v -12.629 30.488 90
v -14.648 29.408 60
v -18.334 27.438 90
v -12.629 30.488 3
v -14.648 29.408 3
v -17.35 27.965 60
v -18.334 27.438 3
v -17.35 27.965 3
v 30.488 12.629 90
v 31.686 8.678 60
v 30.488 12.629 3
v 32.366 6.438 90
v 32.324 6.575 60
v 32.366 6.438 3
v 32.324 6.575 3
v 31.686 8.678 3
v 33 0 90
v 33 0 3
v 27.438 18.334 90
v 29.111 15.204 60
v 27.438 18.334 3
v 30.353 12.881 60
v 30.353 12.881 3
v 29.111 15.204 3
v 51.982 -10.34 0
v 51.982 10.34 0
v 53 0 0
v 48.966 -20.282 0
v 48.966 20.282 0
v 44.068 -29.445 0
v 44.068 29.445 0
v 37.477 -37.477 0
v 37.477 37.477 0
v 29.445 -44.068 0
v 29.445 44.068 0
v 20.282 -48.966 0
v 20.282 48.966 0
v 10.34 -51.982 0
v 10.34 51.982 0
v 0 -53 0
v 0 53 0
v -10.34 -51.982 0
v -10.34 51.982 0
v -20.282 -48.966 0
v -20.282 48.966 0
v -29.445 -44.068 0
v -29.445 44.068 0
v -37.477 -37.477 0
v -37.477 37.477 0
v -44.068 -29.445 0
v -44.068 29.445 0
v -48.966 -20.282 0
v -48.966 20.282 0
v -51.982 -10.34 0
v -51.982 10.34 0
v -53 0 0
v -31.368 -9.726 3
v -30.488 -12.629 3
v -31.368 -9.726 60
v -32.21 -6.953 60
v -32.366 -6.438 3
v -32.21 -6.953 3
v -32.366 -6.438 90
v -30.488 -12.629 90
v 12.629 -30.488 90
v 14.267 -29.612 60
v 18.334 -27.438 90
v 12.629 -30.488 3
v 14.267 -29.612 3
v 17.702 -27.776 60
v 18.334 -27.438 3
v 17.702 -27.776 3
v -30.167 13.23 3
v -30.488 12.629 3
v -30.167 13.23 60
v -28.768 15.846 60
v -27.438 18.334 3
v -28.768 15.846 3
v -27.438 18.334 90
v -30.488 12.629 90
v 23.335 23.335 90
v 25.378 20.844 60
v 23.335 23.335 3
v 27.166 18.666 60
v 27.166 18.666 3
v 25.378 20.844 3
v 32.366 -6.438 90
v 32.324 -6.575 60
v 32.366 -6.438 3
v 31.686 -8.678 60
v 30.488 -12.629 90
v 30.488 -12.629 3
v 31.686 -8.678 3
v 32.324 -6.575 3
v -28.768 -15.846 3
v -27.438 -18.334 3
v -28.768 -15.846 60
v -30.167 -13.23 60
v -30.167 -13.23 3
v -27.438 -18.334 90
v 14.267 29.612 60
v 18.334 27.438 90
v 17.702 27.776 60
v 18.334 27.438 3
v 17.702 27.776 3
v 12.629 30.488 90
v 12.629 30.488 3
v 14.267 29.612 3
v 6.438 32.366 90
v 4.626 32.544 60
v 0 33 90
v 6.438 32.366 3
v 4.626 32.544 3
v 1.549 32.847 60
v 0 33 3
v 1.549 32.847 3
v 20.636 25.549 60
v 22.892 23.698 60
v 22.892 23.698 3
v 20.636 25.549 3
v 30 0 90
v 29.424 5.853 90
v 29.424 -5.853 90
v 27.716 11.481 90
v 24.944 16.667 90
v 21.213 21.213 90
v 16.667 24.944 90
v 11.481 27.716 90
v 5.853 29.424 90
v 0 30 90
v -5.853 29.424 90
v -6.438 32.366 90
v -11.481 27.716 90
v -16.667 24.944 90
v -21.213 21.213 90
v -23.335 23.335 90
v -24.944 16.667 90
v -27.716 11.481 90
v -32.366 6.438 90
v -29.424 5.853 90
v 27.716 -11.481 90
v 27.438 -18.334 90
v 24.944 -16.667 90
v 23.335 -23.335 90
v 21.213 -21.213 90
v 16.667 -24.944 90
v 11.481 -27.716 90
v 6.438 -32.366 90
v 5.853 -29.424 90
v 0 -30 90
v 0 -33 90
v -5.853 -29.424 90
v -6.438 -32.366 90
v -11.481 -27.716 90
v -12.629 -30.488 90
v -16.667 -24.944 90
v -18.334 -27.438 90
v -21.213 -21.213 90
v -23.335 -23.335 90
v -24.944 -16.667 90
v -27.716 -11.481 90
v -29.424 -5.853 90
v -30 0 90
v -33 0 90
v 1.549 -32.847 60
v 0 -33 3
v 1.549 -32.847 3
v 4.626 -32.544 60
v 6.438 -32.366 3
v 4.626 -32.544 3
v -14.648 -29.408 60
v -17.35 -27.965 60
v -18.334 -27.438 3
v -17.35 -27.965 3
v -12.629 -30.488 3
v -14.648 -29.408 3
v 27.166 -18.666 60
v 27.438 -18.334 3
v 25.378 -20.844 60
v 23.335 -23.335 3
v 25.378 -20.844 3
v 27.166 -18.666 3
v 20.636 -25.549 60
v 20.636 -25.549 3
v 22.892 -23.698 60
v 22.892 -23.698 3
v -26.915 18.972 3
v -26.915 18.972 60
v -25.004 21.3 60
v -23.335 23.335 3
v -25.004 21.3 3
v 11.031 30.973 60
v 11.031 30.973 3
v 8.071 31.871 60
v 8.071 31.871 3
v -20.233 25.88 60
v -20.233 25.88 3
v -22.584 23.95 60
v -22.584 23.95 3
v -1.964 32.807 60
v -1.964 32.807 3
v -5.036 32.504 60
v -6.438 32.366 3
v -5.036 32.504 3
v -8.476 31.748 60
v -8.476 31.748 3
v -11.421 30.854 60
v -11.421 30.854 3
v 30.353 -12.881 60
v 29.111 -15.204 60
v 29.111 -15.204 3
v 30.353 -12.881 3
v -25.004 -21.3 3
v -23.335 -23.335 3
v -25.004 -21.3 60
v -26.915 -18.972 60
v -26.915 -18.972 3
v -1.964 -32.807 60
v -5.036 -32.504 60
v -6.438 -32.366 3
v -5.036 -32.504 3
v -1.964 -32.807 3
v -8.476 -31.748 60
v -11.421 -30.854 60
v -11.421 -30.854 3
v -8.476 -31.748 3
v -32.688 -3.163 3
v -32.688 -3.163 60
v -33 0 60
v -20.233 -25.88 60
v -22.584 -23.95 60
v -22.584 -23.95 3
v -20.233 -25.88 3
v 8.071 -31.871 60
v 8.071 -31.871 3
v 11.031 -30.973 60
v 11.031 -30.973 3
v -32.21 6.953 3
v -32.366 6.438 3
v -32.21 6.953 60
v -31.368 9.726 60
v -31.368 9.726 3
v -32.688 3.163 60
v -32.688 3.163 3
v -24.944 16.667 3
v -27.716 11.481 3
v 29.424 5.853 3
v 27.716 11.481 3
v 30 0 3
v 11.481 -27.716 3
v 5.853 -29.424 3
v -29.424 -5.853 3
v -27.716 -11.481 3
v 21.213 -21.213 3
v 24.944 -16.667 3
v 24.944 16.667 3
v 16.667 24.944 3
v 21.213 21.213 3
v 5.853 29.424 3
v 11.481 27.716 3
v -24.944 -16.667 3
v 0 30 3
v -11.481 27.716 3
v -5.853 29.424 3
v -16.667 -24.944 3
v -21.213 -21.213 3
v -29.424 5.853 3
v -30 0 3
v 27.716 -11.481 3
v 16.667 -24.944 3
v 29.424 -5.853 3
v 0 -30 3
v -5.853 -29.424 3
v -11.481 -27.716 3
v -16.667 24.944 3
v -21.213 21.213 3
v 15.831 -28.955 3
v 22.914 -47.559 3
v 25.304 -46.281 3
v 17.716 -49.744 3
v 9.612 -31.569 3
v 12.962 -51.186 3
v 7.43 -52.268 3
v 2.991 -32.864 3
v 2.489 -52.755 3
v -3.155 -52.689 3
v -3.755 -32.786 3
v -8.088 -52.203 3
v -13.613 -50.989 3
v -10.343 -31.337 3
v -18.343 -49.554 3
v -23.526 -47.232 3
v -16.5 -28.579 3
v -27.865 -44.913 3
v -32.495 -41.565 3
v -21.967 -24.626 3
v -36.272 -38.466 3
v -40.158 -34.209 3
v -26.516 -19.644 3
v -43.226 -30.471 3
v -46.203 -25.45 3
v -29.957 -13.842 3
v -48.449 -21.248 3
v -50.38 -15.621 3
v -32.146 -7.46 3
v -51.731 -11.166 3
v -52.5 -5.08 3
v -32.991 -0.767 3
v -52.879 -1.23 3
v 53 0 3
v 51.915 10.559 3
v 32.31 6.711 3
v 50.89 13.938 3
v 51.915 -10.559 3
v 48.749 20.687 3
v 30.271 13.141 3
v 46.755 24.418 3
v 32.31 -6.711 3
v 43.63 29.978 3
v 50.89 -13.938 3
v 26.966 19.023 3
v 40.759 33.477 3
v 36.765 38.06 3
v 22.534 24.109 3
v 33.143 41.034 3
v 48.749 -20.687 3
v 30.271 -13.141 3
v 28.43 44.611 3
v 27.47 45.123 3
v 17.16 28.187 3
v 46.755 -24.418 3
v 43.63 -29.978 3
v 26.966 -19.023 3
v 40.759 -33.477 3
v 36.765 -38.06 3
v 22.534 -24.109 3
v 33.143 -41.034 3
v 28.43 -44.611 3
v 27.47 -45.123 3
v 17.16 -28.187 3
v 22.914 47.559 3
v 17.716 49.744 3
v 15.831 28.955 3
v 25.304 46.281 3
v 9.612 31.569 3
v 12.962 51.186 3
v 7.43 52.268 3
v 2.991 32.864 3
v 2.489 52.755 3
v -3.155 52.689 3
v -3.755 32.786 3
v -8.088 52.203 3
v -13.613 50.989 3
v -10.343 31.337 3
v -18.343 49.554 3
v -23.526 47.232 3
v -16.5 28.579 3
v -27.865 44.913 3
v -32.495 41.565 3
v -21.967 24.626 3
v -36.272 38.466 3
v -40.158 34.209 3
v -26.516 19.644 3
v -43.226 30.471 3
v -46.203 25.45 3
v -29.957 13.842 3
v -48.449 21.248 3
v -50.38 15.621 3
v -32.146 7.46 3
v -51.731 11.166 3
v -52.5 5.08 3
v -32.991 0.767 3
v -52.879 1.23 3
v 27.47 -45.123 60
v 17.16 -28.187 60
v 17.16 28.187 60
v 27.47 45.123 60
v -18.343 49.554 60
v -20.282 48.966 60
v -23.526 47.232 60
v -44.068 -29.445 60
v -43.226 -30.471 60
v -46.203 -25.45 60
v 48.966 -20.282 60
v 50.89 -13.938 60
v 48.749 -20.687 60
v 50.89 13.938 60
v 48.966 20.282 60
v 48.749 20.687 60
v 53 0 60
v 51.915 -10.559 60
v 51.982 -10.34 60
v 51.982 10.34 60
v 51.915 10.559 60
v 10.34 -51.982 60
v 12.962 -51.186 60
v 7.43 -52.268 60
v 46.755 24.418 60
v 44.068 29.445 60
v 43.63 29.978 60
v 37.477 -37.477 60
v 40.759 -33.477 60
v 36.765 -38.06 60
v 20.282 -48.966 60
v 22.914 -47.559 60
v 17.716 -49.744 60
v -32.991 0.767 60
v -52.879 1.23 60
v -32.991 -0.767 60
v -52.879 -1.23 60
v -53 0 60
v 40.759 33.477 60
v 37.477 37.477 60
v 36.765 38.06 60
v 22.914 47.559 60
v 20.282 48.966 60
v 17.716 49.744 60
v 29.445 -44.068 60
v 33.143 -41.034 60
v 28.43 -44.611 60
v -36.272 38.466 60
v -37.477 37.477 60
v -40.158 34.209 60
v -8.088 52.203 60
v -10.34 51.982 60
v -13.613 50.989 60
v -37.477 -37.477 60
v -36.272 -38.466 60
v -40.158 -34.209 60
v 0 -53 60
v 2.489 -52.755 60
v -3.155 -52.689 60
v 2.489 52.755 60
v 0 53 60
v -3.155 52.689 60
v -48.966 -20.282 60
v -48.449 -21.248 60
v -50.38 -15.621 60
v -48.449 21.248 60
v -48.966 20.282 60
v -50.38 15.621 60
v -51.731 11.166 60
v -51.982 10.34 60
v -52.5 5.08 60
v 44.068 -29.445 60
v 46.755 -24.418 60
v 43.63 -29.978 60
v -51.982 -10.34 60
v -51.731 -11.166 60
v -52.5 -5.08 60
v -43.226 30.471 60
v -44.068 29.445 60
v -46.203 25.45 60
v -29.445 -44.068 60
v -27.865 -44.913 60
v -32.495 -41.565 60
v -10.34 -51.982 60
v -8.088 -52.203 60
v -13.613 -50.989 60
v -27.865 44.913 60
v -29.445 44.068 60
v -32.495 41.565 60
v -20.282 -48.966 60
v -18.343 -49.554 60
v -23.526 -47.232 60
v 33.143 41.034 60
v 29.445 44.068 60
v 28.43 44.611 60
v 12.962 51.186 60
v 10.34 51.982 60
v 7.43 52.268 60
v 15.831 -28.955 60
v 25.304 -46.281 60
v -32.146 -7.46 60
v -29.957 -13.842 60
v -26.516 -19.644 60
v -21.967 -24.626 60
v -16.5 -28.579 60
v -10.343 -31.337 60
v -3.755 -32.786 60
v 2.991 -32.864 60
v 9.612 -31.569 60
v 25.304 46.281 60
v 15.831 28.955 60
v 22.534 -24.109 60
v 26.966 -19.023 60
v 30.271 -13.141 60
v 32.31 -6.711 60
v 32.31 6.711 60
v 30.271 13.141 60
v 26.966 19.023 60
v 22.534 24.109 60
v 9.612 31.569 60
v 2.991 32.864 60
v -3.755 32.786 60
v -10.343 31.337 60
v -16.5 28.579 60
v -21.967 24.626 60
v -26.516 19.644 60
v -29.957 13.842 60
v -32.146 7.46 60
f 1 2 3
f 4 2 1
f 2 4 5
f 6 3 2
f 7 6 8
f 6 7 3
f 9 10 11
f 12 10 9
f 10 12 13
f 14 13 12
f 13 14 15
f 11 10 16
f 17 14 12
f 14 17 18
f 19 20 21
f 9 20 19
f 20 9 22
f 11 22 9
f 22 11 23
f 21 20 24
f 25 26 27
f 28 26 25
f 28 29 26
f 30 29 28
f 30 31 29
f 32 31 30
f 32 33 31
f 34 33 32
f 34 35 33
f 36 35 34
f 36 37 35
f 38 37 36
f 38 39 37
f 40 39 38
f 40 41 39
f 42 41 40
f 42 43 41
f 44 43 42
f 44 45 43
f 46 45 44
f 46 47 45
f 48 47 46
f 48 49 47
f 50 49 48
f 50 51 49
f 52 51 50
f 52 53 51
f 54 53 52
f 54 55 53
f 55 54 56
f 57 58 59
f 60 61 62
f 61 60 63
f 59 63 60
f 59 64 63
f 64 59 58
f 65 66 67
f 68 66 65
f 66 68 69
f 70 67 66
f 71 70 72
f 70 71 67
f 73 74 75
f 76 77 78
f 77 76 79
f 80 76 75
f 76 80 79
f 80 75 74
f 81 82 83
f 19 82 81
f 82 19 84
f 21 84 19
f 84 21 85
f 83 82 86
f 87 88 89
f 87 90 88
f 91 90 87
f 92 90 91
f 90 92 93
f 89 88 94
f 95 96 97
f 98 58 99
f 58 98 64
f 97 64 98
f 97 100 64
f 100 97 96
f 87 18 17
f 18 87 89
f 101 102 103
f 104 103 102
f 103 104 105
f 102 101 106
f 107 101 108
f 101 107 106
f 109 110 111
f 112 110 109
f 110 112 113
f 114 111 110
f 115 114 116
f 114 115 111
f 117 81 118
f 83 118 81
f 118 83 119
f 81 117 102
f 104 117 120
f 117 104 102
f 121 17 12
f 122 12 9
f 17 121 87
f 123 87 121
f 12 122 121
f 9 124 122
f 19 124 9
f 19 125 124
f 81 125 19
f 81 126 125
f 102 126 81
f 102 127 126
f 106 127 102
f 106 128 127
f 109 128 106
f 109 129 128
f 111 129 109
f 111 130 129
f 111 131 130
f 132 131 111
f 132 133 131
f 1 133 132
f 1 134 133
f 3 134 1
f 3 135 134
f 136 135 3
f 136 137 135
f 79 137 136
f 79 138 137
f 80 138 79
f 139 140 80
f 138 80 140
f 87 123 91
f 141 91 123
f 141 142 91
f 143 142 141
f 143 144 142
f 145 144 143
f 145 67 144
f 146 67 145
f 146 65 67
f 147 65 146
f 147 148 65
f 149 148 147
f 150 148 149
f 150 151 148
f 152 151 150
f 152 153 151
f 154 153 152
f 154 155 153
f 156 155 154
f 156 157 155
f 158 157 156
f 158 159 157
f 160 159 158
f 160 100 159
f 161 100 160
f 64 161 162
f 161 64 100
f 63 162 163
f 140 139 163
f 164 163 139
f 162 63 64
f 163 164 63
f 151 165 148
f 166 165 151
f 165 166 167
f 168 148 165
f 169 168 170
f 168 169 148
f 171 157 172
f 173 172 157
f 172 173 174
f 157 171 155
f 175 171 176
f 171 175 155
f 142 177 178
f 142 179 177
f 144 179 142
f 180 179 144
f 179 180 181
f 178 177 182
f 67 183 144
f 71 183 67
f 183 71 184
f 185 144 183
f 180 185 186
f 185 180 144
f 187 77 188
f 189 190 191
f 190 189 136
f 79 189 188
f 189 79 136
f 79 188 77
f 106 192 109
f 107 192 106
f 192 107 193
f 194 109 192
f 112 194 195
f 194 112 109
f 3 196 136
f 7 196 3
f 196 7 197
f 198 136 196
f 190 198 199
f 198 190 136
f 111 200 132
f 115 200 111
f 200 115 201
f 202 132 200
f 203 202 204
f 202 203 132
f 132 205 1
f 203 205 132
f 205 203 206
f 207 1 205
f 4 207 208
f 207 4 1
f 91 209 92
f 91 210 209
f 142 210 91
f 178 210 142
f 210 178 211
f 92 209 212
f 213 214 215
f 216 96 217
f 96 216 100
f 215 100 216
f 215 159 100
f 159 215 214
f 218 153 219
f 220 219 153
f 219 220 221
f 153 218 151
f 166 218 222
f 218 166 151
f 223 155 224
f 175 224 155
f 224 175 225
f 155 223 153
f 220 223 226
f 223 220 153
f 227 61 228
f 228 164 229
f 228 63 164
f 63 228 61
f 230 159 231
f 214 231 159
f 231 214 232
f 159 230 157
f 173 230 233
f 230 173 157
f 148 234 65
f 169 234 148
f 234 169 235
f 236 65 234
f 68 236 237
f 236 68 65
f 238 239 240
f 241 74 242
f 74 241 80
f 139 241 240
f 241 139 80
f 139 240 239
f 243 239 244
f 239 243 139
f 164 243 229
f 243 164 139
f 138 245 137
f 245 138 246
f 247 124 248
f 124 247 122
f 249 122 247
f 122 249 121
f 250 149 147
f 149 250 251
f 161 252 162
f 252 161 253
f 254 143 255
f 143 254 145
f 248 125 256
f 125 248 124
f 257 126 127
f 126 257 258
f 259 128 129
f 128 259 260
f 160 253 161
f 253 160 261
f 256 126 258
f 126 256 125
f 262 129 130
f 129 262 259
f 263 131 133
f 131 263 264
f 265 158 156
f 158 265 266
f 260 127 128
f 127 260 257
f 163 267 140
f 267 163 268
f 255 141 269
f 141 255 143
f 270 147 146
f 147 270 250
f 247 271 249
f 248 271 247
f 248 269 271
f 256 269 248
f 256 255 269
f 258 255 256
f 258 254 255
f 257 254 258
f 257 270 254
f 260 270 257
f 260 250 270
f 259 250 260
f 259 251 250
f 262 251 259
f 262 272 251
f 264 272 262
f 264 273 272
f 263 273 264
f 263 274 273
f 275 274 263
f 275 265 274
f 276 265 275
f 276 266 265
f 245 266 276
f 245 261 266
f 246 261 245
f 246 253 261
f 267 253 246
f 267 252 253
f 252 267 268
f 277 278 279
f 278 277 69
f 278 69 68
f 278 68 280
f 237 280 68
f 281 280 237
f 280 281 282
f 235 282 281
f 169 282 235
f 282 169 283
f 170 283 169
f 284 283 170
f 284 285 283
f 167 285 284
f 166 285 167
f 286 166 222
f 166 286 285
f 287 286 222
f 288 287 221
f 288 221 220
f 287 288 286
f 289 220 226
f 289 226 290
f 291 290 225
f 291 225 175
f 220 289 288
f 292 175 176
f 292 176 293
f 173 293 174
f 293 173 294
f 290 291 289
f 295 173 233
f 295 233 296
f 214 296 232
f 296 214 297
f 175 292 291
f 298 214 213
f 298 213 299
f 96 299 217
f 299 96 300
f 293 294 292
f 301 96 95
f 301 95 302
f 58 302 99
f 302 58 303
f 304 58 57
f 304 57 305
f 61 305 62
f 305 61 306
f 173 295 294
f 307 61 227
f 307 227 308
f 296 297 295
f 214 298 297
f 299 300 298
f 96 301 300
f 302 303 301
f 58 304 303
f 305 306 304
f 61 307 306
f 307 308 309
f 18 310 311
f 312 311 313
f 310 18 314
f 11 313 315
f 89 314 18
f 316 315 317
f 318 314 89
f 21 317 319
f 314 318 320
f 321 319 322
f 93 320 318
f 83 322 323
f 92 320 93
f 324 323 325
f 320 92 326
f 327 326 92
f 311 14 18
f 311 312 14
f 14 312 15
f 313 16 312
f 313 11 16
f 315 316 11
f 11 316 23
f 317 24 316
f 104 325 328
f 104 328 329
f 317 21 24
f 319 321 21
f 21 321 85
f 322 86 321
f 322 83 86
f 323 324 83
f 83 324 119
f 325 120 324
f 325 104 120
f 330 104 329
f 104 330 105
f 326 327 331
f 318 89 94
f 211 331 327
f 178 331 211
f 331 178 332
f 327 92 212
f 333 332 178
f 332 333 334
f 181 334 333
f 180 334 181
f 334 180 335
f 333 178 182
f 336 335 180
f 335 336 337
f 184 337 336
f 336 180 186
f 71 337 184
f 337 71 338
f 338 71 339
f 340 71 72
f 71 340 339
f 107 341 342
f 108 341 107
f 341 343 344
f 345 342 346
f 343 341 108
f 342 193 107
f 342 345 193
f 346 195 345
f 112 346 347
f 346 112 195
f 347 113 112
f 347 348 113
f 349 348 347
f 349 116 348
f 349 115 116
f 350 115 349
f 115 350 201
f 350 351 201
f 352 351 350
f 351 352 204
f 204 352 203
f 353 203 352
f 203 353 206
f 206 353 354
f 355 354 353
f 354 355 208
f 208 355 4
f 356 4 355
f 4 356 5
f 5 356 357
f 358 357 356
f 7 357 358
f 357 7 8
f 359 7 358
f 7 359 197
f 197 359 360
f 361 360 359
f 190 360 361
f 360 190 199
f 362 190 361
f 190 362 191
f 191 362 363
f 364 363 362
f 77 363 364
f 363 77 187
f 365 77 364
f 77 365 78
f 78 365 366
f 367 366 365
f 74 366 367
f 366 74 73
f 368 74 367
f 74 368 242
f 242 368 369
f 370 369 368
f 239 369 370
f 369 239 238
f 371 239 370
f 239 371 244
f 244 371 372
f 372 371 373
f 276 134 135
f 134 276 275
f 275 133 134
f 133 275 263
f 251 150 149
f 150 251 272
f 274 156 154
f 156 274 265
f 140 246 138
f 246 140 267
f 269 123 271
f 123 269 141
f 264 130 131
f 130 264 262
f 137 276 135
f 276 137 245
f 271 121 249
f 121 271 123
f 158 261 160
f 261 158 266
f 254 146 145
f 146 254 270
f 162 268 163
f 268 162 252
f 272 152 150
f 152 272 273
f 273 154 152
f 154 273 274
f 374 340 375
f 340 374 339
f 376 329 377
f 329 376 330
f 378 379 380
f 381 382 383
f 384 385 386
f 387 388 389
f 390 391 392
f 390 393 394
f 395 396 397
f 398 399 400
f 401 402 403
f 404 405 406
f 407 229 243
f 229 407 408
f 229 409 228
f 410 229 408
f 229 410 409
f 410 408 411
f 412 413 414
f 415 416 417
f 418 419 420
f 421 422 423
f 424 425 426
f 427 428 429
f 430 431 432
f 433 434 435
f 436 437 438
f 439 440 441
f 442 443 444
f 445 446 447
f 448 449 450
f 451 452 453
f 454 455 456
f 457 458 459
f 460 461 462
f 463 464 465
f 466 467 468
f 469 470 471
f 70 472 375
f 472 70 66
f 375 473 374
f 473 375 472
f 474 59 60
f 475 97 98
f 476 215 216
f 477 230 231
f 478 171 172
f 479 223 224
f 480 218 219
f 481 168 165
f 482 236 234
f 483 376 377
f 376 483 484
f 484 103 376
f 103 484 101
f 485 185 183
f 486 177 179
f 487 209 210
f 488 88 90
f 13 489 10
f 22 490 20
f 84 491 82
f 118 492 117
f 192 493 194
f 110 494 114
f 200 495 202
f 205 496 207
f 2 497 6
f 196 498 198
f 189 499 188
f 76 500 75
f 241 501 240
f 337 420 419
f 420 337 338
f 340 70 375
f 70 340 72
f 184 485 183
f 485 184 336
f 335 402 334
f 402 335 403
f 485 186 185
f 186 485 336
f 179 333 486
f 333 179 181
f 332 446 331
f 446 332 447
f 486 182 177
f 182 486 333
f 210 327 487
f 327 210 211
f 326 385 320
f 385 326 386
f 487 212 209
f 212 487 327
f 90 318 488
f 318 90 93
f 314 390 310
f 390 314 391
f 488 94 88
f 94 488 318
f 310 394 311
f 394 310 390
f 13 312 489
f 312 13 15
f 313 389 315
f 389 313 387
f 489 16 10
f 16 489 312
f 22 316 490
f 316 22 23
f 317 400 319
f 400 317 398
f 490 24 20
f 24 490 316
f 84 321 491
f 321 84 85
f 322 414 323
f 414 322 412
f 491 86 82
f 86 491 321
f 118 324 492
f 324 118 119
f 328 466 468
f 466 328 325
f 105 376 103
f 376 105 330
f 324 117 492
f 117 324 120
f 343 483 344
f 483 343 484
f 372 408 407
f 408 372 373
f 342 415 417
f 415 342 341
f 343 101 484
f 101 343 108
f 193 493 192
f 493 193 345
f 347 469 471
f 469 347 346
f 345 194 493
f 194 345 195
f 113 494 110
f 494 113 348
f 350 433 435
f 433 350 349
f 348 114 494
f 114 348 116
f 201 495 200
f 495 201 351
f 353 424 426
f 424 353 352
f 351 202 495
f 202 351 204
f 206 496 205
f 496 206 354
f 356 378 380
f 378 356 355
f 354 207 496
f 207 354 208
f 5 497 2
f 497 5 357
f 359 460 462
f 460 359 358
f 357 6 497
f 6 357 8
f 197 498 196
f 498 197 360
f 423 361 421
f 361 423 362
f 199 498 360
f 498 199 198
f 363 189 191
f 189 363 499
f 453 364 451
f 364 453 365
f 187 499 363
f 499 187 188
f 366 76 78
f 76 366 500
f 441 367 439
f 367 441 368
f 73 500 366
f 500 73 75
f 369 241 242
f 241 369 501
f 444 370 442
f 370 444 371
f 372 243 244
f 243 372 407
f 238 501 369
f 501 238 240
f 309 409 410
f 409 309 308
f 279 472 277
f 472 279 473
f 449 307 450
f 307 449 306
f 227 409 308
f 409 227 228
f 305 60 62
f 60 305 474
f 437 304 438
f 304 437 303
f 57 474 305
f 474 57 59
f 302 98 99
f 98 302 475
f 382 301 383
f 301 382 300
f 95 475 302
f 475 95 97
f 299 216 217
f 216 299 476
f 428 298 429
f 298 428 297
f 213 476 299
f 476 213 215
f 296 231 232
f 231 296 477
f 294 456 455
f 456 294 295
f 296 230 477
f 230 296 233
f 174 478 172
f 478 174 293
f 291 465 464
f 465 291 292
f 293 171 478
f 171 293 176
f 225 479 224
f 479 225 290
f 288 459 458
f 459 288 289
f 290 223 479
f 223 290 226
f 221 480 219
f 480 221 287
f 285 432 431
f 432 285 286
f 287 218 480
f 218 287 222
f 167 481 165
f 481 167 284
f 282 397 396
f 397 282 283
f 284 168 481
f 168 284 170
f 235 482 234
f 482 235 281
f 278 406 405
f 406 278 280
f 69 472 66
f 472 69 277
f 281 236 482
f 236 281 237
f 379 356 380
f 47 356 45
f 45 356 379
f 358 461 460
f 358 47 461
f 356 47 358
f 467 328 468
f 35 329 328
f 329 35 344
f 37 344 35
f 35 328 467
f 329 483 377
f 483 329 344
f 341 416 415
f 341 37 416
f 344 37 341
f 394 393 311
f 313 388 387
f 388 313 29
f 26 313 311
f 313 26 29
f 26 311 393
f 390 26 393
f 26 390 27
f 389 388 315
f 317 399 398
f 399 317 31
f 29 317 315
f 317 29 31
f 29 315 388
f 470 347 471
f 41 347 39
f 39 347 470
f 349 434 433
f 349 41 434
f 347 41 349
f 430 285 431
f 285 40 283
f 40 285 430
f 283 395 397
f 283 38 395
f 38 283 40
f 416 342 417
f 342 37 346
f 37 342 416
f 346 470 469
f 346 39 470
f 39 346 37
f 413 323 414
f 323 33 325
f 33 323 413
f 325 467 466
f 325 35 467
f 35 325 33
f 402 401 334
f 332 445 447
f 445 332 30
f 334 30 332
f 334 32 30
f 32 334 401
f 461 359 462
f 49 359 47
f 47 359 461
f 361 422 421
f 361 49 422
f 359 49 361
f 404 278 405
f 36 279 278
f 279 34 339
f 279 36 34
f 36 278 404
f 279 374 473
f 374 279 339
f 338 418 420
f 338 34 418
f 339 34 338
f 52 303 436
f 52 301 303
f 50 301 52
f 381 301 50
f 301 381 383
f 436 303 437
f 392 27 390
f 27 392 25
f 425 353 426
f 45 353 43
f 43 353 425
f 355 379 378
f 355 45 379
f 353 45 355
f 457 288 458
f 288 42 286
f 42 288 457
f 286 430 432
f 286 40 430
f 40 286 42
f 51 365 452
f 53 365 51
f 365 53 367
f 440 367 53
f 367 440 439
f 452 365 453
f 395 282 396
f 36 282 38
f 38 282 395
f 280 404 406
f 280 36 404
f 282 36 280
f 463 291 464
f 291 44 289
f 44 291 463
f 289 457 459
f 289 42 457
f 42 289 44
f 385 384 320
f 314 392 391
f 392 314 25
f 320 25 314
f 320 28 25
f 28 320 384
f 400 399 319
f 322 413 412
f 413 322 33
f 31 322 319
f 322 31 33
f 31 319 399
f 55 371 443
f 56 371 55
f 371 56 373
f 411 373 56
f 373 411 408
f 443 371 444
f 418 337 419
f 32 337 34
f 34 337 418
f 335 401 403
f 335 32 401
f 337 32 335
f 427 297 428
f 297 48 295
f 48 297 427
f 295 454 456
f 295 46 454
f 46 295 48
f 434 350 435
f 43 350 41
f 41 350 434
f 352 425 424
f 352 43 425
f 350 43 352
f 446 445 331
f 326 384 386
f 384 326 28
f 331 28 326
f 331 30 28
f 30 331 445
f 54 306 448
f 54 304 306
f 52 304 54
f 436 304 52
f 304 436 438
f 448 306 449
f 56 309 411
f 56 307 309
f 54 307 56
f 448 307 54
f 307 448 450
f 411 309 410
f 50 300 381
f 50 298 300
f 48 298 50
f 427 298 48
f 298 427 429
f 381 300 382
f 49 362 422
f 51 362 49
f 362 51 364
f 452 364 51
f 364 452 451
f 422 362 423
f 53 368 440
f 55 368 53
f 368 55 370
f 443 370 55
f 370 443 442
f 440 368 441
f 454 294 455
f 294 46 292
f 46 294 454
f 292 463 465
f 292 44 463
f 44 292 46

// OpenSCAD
// Stiftköcher mit geschlossenem Innenbecher + niedrigem Außenring mit Fächern
// Version 2.2

// --- Parameter ---
inner_diameter       = 60;   // Durchmesser des inneren Hauptfachs (mm)
inner_height         = 90;   // Höhe des inneren Hauptfachs (mm)

outer_ring_width     = 20;   // Breite des äußeren Ringes (mm)
outer_height         = 60;   // Höhe der äußeren Fächer + äußerer Rand (mm)

wall_thickness       = 3;    // Wandstärke (innen und außen)
bottom_thickness     = 3;    // Bodenstärke (mm)

outer_compartments   = 3;   // Anzahl der schmalen Außenfächer
outer_wall_thickness = 2;    // Dicke der Zwischenwände außen (mm)

$fn = 32; // Glätte für Rundungen

// --- Hilfsfunktion: Grad/Rad ---
function rad2deg(a) = a * 180 / PI;

// --- Modul: Ringschneide-Sektor (für Hohlräume der Außenfächer) ---
module ring_sector(r_in, r_out, angle_deg, h) {
    rotate([0,0,-angle_deg/2])  // Zentriere den Sektor
    rotate_extrude(angle = angle_deg, convexity = 10)
        translate([r_in, 0, 0])
            square([r_out - r_in, h], center = false);
}

// --- Hauptmodul ---
module pen_holder() {
    inner_r = inner_diameter/2;
    outer_r_in  = inner_r + wall_thickness;
    outer_r_out = outer_r_in + outer_ring_width;

    // 1) Innenbecher mit geschlossenem Rand
    difference() {
        cylinder(h = inner_height, r = inner_r + wall_thickness);
        translate([0,0,bottom_thickness])
            cylinder(h = inner_height - bottom_thickness, r = inner_r);
    }

    // 2) Außenring mit niedriger Höhe + Fächern
    difference() {
        // Außenringkörper
        cylinder(h = outer_height, r = outer_r_out);
        translate([0,0,bottom_thickness])
            cylinder(h = outer_height - bottom_thickness, r = outer_r_in);

        // Fächer als ausgesparte Sektoren
        ring_mid_r = (outer_r_in + outer_r_out) / 2;
        wall_angle_deg = rad2deg(outer_wall_thickness / ring_mid_r);
        base_angle_deg = 360 / outer_compartments;
        slot_angle_deg = max(1, base_angle_deg - wall_angle_deg);

        for (i = [0:outer_compartments-1]) {
            angle_center = i * base_angle_deg;
            translate([0,0,bottom_thickness])
                rotate([0,0,angle_center])
                    ring_sector(outer_r_in, outer_r_out, slot_angle_deg, outer_height - bottom_thickness);
        }
    }
}

// --- Aufruf ---
pen_holder();
